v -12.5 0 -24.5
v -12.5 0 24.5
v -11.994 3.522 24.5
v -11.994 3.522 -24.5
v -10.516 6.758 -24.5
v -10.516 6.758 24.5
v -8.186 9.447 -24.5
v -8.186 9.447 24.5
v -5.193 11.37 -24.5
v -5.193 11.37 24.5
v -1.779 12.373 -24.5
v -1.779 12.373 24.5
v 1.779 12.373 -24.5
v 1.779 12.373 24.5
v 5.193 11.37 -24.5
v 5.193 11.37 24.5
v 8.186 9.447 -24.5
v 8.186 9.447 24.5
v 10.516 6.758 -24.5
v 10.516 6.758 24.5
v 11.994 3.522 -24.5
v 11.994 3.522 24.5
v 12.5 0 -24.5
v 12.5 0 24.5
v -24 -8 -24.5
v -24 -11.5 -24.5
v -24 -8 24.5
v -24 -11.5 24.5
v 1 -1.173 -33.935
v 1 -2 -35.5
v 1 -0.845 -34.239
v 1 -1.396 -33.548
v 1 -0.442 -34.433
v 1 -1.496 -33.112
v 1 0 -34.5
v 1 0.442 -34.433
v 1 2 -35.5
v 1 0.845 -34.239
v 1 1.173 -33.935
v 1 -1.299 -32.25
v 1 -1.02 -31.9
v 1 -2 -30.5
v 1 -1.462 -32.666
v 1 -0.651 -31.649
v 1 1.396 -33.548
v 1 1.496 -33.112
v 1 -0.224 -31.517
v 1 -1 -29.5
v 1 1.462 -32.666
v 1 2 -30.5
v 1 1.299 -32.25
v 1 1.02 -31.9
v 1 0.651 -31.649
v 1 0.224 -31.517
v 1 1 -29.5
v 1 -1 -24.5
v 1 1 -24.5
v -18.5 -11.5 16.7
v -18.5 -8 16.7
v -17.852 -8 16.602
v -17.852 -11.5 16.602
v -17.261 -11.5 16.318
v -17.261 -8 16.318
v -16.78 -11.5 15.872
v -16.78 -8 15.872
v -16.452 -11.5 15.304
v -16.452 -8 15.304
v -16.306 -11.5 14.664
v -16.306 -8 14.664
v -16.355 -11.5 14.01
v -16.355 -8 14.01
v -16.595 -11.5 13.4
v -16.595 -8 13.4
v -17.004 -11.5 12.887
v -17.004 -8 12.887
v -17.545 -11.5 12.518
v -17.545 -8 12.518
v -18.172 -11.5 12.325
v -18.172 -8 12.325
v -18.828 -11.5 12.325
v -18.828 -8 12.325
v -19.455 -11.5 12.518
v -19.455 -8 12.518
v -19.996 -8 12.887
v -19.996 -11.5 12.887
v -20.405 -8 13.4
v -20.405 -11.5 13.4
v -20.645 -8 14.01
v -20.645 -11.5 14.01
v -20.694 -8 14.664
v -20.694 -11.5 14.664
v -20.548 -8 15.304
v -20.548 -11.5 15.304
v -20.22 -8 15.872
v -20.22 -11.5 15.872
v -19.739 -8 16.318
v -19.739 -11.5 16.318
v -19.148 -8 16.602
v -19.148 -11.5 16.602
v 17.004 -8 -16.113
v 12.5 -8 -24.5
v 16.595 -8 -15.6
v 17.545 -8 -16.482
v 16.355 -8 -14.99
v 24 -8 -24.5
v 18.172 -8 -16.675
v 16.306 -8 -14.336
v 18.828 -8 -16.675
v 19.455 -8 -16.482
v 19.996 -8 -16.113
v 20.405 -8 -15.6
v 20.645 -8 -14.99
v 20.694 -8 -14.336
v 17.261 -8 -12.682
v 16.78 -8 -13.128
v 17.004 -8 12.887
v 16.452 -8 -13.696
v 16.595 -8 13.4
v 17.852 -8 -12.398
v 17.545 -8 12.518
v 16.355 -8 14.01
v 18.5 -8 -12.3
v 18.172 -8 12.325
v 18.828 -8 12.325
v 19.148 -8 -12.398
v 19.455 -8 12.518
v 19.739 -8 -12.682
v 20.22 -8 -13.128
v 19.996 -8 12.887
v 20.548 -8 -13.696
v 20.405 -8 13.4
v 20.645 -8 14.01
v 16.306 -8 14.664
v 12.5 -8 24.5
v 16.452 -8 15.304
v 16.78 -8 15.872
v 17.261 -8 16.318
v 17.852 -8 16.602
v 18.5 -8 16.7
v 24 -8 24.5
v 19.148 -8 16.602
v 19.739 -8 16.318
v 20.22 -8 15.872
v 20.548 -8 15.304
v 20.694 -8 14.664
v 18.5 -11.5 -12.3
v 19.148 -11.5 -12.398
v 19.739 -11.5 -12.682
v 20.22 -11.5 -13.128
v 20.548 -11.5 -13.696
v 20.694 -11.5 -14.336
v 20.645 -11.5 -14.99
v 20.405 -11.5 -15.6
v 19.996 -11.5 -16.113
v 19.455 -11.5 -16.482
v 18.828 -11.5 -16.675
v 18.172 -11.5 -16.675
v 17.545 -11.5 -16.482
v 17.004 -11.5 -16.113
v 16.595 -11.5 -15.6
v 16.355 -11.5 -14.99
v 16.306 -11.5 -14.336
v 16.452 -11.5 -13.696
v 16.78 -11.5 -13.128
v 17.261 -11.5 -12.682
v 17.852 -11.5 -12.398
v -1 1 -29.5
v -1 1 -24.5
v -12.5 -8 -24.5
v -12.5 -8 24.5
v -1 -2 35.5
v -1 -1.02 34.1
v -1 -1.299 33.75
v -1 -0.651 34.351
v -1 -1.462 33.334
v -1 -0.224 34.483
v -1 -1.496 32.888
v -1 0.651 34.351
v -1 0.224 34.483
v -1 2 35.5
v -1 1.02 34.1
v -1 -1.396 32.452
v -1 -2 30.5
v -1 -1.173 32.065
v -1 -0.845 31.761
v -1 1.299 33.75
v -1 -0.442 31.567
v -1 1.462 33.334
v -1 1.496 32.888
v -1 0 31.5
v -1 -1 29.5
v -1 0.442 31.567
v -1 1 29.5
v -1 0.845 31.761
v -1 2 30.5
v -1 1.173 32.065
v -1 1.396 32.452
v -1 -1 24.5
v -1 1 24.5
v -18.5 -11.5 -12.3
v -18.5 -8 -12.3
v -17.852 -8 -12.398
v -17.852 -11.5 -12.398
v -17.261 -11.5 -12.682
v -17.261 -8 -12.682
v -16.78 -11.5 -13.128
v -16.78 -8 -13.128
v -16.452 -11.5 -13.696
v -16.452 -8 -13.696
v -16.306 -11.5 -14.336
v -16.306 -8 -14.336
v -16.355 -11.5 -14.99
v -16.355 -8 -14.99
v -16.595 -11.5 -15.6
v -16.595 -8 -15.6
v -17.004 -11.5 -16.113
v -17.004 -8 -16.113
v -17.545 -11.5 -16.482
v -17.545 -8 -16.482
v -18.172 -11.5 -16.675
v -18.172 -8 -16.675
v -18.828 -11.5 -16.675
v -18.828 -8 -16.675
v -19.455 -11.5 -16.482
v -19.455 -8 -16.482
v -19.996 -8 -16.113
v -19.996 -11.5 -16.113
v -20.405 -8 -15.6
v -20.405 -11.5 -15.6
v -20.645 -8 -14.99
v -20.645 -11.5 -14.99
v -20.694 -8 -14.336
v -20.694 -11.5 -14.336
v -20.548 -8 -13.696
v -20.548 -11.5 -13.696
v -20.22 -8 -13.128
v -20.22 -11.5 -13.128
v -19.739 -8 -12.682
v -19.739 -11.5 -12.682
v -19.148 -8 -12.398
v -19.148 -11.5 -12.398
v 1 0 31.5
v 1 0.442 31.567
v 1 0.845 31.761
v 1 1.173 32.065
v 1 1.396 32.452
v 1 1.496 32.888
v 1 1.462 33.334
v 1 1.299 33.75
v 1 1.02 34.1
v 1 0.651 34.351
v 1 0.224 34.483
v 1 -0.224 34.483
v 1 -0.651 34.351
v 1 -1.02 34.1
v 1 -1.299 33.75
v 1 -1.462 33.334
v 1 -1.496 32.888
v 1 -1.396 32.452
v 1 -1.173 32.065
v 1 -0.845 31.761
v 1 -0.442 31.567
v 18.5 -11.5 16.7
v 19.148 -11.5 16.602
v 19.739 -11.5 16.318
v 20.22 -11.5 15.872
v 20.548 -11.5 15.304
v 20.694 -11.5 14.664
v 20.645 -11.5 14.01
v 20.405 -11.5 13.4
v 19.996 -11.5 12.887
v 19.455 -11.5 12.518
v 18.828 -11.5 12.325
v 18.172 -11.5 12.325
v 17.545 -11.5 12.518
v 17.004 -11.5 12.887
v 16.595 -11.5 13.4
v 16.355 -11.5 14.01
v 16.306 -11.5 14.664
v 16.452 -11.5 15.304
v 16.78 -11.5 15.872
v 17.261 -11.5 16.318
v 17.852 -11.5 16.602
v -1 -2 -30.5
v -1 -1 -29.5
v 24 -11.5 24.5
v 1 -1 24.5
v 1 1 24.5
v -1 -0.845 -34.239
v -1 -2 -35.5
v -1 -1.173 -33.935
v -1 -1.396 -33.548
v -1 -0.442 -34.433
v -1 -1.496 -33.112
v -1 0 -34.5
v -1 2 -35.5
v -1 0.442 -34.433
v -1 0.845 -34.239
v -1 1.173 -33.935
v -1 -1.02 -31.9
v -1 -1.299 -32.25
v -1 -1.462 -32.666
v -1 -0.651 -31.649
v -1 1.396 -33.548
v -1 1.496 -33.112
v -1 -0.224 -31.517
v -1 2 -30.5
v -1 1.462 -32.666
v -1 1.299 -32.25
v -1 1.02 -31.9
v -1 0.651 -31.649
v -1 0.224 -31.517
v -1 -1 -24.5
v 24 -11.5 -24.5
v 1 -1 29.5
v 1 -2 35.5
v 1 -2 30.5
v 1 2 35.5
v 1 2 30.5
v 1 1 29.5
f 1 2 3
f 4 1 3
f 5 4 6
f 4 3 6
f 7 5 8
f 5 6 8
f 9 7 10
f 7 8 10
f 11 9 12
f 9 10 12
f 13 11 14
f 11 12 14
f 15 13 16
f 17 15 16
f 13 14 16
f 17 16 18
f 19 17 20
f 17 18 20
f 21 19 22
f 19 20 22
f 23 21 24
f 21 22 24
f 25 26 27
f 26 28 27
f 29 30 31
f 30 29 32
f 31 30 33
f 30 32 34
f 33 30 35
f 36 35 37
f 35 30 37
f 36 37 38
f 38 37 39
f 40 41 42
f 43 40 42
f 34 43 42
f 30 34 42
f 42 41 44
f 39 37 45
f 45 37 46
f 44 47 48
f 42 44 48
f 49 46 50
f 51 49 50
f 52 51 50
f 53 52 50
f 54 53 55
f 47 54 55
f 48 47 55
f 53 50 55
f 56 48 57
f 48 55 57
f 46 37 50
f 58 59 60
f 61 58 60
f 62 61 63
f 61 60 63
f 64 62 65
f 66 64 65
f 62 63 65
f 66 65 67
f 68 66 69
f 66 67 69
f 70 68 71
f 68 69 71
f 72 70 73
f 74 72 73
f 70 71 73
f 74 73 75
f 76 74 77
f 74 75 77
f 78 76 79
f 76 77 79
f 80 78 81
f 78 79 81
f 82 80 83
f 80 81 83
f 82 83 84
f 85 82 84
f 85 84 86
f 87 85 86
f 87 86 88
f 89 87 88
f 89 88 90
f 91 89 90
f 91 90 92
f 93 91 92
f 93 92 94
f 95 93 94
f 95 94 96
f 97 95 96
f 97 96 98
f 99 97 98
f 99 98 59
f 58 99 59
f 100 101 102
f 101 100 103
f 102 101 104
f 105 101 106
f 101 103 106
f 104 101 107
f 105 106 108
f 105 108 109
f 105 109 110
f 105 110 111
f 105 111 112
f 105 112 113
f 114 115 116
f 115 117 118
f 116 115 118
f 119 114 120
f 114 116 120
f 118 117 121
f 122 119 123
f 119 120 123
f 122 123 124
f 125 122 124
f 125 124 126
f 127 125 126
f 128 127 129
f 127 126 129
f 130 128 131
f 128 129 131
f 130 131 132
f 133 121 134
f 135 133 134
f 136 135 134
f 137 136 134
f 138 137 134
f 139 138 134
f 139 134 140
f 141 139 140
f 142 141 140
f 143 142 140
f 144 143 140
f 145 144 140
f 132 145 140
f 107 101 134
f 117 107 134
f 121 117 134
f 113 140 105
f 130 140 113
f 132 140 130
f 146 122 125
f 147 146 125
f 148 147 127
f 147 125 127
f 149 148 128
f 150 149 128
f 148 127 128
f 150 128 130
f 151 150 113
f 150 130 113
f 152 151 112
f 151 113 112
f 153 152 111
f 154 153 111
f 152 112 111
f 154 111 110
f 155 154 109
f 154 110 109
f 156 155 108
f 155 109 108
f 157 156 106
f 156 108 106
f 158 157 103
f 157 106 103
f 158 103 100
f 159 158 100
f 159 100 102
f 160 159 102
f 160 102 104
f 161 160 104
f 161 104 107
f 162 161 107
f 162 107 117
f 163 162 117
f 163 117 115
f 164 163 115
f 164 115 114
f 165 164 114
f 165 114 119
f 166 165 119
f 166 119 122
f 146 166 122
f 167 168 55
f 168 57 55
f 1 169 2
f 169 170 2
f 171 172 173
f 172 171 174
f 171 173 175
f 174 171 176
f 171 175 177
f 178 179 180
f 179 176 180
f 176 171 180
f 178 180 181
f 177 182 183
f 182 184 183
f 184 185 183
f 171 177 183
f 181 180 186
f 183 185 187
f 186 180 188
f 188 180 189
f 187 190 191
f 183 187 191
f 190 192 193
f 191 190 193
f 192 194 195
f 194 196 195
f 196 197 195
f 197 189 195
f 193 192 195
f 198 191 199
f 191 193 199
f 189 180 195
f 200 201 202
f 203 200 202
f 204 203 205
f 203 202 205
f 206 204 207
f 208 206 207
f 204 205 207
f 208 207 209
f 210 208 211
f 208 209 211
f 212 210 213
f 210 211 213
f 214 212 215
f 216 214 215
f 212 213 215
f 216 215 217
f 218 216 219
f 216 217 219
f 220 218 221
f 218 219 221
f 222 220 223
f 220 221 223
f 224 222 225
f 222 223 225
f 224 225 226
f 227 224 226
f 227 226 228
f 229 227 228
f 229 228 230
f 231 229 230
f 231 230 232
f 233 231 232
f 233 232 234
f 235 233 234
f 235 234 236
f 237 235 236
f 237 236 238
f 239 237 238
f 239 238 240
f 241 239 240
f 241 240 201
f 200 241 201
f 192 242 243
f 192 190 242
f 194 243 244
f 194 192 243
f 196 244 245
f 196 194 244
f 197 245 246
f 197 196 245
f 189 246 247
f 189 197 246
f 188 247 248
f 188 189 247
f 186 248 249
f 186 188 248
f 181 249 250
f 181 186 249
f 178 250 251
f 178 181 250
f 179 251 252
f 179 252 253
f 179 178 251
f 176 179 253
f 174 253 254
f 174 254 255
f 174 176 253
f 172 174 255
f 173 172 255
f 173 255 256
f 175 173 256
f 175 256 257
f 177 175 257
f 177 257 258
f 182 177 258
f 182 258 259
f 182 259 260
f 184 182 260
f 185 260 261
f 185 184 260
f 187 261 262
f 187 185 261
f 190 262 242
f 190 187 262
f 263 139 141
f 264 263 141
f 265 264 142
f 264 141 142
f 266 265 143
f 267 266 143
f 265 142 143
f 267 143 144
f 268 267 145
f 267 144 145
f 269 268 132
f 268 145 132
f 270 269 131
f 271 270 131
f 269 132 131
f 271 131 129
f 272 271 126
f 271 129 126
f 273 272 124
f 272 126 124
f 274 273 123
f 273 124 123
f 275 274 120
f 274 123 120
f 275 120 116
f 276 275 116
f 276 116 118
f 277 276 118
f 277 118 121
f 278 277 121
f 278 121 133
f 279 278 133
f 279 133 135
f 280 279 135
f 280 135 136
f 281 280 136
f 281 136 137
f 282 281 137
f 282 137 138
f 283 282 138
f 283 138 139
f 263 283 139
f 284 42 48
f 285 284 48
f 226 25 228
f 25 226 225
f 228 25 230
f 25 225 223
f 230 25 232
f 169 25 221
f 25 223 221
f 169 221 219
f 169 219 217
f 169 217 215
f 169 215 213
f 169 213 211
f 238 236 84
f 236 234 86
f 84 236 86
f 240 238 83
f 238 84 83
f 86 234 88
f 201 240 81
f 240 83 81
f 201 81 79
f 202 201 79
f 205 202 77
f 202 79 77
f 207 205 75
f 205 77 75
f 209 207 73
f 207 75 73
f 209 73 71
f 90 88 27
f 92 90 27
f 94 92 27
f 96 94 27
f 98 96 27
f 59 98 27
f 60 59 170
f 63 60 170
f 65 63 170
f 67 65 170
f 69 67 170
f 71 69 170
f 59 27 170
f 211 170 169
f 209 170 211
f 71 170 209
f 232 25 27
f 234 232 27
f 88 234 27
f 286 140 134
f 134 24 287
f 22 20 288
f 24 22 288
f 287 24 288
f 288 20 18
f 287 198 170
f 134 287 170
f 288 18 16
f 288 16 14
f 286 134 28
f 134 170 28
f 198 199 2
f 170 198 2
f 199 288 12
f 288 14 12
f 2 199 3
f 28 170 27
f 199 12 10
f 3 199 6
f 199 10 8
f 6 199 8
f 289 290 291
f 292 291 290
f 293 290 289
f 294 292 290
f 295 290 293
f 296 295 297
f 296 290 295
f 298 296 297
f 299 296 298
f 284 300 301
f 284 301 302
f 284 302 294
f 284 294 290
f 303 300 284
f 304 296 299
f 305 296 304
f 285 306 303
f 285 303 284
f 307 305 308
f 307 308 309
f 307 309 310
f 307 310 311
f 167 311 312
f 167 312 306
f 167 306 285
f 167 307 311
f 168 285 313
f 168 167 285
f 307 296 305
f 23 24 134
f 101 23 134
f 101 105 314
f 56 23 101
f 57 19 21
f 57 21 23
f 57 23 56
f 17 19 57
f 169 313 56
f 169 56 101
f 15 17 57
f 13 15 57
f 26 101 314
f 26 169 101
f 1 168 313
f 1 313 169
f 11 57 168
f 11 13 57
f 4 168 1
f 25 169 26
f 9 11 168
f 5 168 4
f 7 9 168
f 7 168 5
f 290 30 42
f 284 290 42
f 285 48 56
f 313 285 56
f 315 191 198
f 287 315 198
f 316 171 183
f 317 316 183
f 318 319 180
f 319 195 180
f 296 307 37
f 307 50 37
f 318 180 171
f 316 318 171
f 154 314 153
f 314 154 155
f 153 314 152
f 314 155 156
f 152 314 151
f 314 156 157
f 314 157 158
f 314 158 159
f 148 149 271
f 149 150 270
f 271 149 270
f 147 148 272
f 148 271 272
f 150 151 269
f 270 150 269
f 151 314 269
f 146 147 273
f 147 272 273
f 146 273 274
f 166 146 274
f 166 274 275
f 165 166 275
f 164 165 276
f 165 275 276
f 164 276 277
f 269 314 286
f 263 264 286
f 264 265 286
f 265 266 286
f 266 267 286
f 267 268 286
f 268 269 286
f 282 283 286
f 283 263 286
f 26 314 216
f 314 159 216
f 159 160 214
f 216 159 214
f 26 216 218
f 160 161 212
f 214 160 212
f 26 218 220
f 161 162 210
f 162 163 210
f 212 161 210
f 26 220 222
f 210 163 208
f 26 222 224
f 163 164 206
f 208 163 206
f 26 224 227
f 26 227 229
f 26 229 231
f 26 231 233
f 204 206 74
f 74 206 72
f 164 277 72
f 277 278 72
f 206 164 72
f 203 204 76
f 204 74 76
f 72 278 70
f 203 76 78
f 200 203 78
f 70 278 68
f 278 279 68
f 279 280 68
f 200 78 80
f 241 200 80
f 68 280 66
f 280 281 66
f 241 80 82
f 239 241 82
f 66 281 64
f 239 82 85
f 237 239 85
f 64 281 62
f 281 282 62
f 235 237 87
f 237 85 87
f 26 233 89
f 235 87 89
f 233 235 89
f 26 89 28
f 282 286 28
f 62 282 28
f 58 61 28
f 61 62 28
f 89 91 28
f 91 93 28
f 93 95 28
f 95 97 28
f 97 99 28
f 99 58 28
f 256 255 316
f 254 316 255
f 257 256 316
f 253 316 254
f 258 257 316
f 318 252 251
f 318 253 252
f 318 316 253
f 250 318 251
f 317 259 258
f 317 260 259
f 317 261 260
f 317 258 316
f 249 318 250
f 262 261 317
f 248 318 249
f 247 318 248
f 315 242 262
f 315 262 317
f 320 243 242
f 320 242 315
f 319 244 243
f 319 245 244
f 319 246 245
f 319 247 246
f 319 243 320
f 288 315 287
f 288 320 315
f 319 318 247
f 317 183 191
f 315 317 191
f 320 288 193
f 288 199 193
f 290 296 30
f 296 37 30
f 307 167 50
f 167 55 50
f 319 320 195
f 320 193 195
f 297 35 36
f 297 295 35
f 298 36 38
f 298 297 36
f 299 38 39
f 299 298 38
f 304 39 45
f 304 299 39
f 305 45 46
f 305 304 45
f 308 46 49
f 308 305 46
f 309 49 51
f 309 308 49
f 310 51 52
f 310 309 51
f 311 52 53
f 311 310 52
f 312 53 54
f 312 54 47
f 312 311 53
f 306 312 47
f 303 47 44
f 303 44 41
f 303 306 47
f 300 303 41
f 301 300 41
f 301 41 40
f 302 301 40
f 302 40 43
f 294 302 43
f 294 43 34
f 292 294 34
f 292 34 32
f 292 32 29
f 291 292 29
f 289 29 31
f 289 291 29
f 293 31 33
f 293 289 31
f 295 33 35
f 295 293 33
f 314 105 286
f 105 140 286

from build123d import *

# Parameters (mm, degrees)
BOSS_EXTRUDE1_DEPTH = 24.5
SKETCH2_R           = 2.2
CUT_EXTRUDE1_DEPTH  = 40.956226048
SKETCH3_R           = 1.5
BOSS_EXTRUDE2_DEPTH = 1


with BuildPart() as part:
    # Sketch1 → Boss-Extrude1 (new, symmetric)
    with BuildSketch(Plane.XY):
        with BuildLine():
            Line((12.5, -8), (24, -8))
            Line((24, -8), (24, -11.5))
            Line((24, -11.5), (-24, -11.5))
            Line((-24, -11.5), (-24, -8))
            Line((-24, -8), (-12.5, -8))
            Line((-12.5, -8), (-12.5, 0))
            ThreePointArc((-12.5, 0), (0, 12.5), (12.5, 0))
            Line((12.5, 0), (12.5, -8))
        make_face()
    extrude(amount=BOSS_EXTRUDE1_DEPTH, both=True)

    # Sketch2 → Cut-Extrude1 (cut, through all)
    with BuildSketch(Plane(origin=(0, -8, 0), x_dir=(1, 0, 0), z_dir=(0, 1, 0))):
        with Locations(Location((-18.5, 14.5, 0), (0, 0, 270))):
            Circle(SKETCH2_R)
        with Locations(Location((-18.5, -14.5, 0), (0, 0, 270))):
            Circle(SKETCH2_R)
        with Locations(Location((18.5, -14.5, 0), (0, 0, 270))):
            Circle(SKETCH2_R)
        with Locations(Location((18.5, 14.5, 0), (0, 0, 270))):
            Circle(SKETCH2_R)
    extrude(amount=-CUT_EXTRUDE1_DEPTH, mode=Mode.SUBTRACT)

    # Sketch3 → Boss-Extrude2 (add, symmetric)
    # profile 1 of 2: a face of its own
    with BuildSketch(Plane(origin=(0, 0, 0), x_dir=(0, 0, -1), z_dir=(1, 0, 0))):
        Polygon((-29.5, -1), (-24.5, -1), (-24.5, 1), (-29.5, 1), (-30.5, 2), (-35.5, 2), (-35.5, -2), (-30.5, -2), align=None)
        with Locations((-33, 0)):
            Circle(SKETCH3_R, mode=Mode.SUBTRACT)
    # profile 2 of 2: a face of its own
    with BuildSketch(Plane(origin=(0, 0, 0), x_dir=(0, 0, -1), z_dir=(1, 0, 0))):
        Polygon((24.5, -1), (24.5, 1), (29.5, 1), (30.5, 2), (35.5, 2), (35.5, -2), (30.5, -2), (29.5, -1), align=None)
        with Locations((33, 0)):
            Circle(SKETCH3_R, mode=Mode.SUBTRACT)
    extrude(amount=BOSS_EXTRUDE2_DEPTH, both=True)


solid = part.part
